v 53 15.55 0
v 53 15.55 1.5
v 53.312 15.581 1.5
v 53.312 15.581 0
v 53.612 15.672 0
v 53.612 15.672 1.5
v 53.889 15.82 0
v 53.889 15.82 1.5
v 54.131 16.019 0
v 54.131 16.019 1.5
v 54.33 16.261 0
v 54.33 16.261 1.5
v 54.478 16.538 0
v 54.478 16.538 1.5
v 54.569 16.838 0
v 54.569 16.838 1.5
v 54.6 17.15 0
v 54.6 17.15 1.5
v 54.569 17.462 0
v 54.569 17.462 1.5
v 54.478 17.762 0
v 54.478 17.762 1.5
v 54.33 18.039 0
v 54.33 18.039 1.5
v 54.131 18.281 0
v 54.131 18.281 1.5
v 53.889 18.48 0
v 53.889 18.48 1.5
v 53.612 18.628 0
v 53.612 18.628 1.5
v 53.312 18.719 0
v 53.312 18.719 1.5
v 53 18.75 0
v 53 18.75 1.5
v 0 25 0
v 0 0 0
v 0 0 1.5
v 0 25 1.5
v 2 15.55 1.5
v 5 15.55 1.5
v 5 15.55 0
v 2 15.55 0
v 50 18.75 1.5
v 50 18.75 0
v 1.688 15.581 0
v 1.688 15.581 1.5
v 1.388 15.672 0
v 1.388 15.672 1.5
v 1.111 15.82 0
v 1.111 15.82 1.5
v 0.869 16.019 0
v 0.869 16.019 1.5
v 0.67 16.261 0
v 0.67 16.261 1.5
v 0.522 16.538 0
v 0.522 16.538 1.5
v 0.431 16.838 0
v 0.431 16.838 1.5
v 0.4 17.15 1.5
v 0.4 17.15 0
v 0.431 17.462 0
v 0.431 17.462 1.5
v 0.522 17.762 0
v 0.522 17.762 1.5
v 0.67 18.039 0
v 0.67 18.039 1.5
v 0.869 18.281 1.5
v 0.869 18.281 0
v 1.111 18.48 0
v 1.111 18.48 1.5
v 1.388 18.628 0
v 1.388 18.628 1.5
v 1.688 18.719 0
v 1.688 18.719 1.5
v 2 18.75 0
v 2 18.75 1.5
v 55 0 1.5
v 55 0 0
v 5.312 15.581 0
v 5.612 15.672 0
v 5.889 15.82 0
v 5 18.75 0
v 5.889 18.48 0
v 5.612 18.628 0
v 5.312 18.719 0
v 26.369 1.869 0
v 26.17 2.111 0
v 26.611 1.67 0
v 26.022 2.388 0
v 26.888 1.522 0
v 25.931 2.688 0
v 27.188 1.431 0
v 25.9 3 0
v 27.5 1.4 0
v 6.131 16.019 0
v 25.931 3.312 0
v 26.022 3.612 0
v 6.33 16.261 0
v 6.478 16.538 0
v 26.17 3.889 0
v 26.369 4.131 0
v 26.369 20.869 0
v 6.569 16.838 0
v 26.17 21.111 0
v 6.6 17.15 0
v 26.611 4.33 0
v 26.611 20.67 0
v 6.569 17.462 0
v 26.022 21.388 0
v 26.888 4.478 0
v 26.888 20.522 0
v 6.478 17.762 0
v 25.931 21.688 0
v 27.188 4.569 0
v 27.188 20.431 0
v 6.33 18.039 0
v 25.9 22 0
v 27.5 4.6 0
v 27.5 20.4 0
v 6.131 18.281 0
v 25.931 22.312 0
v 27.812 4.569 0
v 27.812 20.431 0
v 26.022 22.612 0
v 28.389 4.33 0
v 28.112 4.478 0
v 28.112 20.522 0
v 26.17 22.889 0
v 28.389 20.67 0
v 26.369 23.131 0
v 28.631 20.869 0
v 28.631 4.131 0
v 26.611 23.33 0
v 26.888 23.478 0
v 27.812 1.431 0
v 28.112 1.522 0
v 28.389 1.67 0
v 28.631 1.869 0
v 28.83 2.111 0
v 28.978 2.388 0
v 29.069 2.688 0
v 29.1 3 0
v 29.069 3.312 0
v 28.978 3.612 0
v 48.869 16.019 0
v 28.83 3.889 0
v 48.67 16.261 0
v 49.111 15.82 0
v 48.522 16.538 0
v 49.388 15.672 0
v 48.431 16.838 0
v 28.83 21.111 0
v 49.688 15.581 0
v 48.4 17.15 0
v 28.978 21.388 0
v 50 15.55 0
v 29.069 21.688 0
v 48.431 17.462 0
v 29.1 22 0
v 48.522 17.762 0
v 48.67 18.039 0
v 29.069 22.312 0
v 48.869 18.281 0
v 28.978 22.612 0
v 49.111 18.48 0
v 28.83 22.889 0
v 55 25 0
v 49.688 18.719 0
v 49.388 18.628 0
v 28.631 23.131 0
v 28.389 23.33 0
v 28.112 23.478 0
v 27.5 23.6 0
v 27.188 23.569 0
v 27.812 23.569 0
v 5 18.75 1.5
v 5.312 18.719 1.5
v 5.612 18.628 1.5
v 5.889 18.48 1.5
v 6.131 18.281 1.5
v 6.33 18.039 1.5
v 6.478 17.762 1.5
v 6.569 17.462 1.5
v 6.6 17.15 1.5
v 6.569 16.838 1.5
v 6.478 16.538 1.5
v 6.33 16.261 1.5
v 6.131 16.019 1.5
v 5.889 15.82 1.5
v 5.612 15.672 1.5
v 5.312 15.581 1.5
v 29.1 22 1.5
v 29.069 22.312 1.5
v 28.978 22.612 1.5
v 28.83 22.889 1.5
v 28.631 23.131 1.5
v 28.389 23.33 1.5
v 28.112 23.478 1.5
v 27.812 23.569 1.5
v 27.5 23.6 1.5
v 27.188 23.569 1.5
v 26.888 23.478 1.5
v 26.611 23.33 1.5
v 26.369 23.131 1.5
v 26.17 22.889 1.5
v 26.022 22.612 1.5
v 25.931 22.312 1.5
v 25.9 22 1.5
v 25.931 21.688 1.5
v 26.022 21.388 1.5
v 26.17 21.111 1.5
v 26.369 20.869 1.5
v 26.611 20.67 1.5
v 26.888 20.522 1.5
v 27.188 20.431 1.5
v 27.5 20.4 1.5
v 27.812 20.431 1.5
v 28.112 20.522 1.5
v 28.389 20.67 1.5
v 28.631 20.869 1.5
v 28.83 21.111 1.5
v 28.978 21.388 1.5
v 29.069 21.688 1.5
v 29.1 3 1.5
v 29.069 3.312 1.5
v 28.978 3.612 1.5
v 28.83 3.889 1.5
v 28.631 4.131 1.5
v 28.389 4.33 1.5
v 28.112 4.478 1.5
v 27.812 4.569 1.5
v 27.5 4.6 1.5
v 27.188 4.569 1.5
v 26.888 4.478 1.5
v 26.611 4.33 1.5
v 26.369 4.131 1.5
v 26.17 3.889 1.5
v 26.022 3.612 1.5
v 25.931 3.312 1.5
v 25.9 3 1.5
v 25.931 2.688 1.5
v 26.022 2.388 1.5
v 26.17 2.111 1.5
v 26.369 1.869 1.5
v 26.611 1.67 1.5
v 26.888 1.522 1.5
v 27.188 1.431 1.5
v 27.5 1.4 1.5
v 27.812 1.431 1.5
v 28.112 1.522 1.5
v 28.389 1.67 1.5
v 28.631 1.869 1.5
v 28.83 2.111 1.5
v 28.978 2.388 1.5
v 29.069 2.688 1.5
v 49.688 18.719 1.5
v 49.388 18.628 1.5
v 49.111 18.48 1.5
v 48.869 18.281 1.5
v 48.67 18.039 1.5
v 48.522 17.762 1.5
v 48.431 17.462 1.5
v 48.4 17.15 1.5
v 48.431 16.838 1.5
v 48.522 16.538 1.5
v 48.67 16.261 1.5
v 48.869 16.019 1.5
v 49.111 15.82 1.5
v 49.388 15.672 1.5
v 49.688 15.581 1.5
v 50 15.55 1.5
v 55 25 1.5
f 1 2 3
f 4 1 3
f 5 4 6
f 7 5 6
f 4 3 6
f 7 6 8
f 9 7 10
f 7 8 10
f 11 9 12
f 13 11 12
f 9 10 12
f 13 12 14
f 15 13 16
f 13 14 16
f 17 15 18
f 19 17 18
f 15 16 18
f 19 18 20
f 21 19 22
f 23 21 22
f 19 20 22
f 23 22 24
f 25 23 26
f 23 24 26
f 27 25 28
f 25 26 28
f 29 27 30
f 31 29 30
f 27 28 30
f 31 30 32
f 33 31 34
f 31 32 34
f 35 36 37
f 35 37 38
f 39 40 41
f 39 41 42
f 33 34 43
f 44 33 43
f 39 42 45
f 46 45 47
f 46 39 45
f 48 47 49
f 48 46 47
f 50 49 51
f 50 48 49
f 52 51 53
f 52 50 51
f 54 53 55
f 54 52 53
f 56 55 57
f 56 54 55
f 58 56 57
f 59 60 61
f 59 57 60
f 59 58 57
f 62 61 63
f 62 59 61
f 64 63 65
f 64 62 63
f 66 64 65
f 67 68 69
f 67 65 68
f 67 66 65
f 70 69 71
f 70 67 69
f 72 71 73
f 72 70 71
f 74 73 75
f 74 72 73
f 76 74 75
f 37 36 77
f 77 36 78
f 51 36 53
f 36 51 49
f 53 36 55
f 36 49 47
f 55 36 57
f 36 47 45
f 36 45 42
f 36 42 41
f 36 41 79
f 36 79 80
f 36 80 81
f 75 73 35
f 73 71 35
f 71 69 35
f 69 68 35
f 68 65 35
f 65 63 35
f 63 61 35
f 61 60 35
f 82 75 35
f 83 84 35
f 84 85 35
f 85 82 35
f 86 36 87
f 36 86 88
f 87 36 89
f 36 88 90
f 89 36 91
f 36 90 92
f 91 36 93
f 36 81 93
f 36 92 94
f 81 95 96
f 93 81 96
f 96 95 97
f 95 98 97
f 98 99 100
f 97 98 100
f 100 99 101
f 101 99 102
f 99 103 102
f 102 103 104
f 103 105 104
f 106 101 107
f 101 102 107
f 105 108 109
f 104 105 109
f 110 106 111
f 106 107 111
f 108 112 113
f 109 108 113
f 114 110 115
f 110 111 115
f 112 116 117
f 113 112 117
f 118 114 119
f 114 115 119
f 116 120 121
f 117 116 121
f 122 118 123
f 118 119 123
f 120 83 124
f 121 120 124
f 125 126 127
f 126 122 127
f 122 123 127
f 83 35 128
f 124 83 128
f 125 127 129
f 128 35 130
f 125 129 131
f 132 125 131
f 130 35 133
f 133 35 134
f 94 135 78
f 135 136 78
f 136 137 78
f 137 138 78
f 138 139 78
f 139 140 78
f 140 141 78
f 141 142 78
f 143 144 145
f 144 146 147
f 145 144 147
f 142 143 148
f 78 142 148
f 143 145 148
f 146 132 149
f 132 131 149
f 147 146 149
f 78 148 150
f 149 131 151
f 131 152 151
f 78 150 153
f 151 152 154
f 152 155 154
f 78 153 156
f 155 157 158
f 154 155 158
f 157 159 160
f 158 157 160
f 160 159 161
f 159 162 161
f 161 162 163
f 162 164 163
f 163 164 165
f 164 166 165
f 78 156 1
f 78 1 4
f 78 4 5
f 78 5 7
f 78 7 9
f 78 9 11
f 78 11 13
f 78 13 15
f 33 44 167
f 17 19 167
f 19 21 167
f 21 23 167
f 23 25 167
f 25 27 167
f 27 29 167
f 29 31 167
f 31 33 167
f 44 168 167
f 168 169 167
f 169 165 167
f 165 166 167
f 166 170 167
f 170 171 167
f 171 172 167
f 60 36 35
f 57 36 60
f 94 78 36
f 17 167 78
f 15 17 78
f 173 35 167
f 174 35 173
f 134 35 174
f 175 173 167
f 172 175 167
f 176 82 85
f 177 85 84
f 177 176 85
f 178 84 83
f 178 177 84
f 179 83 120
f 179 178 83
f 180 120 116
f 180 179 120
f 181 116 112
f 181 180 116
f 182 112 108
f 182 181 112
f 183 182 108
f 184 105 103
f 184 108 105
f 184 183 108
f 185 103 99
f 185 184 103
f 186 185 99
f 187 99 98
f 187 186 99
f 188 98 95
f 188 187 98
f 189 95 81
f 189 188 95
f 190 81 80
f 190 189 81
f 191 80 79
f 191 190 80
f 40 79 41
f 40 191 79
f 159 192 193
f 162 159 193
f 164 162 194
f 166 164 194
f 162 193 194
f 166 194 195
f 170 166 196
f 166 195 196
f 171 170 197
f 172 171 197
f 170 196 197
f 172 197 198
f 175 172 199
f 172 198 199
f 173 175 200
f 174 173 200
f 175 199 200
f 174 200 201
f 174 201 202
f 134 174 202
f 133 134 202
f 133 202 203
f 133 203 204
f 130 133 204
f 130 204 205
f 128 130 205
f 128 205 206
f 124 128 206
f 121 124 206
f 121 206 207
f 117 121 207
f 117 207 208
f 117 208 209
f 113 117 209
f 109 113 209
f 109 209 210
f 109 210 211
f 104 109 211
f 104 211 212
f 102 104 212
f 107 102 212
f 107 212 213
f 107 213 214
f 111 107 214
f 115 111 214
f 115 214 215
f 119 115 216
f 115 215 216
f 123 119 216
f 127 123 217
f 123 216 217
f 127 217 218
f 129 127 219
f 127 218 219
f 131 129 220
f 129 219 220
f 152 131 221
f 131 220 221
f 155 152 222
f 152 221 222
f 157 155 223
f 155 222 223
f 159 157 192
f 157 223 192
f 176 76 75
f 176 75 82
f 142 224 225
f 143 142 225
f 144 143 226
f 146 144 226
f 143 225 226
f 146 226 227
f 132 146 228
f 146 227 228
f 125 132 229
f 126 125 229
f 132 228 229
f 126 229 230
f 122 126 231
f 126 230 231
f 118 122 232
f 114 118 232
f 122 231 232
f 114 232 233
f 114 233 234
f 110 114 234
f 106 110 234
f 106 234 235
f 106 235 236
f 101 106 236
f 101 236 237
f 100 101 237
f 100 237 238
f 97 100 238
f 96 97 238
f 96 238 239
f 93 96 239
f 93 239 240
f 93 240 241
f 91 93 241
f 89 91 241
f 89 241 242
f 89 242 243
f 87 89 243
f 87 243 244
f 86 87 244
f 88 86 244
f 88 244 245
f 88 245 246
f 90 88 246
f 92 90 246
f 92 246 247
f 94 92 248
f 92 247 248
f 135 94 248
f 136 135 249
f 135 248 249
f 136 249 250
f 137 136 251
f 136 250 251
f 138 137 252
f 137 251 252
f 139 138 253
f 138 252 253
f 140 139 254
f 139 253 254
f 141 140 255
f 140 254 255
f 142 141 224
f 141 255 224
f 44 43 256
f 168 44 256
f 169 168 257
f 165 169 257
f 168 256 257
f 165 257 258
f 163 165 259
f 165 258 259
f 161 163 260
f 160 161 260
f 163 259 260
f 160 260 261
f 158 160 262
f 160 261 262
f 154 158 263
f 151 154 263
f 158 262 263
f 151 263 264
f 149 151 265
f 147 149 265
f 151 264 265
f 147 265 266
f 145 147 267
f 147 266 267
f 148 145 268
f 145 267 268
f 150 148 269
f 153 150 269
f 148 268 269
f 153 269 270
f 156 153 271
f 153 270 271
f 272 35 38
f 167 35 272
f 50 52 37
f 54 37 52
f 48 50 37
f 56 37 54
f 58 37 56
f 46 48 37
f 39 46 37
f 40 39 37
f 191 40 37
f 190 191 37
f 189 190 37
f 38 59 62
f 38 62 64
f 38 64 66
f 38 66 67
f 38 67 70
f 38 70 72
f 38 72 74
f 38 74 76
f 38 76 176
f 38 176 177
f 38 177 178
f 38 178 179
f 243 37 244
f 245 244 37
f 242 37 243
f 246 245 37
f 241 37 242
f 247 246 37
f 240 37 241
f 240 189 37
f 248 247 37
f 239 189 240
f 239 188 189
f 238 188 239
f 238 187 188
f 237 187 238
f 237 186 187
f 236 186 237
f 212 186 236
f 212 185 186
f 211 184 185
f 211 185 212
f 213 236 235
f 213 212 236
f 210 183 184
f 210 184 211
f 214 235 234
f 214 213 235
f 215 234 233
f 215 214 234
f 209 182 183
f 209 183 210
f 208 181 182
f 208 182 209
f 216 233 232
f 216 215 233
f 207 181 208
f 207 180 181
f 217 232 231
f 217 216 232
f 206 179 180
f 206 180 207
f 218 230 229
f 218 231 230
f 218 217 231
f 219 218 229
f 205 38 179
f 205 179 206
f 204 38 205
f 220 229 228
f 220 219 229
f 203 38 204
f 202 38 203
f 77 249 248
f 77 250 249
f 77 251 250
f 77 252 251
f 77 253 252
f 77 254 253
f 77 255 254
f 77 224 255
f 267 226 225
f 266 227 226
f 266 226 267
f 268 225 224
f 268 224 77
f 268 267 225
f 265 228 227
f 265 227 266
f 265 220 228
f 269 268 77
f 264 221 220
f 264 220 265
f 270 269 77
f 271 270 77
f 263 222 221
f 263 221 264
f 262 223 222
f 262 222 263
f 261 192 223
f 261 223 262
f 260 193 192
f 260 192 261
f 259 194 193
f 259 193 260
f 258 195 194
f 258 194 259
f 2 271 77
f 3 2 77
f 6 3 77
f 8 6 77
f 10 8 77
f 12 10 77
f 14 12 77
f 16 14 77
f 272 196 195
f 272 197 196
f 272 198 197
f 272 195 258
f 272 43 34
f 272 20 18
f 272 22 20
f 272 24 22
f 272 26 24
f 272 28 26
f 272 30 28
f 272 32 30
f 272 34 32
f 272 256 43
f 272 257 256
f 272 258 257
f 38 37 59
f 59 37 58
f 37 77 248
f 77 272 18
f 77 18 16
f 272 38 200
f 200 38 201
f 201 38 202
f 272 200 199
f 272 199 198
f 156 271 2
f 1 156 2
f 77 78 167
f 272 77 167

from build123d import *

# Parameters (mm, degrees)
SKETCH_1_W          = 55
SKETCH_1_H          = 25
EXTRUDE_1_DEPTH     = 1.5
CUT_EXTRUDE_1_DEPTH = 61.433848132
SKETCH_3_R          = 1.6
CUT_EXTRUDE_2_DEPTH = 61.433848132


with BuildPart() as part:
    # Эскиз1 → Бобышка-Вытянуть1 (new body)
    with BuildSketch(Plane.XY):
        with Locations((27.5, 12.5)):
            Rectangle(SKETCH_1_W, SKETCH_1_H)
    extrude(amount=EXTRUDE_1_DEPTH)

    # Эскиз2 → Вырез-Вытянуть1 (cut, through all)
    with BuildSketch(Plane.XY.offset(1.5)):
        with BuildLine():
            Line((2, 18.75), (5, 18.75))
            ThreePointArc((5, 18.75), (6.6, 17.15), (5, 15.55))
            Line((5, 15.55), (2, 15.55))
            ThreePointArc((2, 15.55), (0.4, 17.15), (2, 18.75))
        make_face()
        with BuildLine():
            Line((53, 18.75), (50, 18.75))
            ThreePointArc((50, 18.75), (48.4, 17.15), (50, 15.55))
            Line((50, 15.55), (53, 15.55))
            ThreePointArc((53, 15.55), (54.6, 17.15), (53, 18.75))
        make_face()
    extrude(amount=-CUT_EXTRUDE_1_DEPTH, mode=Mode.SUBTRACT)

    # Эскиз3 → Вырез-Вытянуть2 (cut, through all)
    with BuildSketch(Plane.XY.offset(1.5)):
        with Locations((27.5, 22)):
            Circle(SKETCH_3_R)
        with Locations((27.5, 3)):
            Circle(SKETCH_3_R)
    extrude(amount=-CUT_EXTRUDE_2_DEPTH, mode=Mode.SUBTRACT)


solid = part.part
